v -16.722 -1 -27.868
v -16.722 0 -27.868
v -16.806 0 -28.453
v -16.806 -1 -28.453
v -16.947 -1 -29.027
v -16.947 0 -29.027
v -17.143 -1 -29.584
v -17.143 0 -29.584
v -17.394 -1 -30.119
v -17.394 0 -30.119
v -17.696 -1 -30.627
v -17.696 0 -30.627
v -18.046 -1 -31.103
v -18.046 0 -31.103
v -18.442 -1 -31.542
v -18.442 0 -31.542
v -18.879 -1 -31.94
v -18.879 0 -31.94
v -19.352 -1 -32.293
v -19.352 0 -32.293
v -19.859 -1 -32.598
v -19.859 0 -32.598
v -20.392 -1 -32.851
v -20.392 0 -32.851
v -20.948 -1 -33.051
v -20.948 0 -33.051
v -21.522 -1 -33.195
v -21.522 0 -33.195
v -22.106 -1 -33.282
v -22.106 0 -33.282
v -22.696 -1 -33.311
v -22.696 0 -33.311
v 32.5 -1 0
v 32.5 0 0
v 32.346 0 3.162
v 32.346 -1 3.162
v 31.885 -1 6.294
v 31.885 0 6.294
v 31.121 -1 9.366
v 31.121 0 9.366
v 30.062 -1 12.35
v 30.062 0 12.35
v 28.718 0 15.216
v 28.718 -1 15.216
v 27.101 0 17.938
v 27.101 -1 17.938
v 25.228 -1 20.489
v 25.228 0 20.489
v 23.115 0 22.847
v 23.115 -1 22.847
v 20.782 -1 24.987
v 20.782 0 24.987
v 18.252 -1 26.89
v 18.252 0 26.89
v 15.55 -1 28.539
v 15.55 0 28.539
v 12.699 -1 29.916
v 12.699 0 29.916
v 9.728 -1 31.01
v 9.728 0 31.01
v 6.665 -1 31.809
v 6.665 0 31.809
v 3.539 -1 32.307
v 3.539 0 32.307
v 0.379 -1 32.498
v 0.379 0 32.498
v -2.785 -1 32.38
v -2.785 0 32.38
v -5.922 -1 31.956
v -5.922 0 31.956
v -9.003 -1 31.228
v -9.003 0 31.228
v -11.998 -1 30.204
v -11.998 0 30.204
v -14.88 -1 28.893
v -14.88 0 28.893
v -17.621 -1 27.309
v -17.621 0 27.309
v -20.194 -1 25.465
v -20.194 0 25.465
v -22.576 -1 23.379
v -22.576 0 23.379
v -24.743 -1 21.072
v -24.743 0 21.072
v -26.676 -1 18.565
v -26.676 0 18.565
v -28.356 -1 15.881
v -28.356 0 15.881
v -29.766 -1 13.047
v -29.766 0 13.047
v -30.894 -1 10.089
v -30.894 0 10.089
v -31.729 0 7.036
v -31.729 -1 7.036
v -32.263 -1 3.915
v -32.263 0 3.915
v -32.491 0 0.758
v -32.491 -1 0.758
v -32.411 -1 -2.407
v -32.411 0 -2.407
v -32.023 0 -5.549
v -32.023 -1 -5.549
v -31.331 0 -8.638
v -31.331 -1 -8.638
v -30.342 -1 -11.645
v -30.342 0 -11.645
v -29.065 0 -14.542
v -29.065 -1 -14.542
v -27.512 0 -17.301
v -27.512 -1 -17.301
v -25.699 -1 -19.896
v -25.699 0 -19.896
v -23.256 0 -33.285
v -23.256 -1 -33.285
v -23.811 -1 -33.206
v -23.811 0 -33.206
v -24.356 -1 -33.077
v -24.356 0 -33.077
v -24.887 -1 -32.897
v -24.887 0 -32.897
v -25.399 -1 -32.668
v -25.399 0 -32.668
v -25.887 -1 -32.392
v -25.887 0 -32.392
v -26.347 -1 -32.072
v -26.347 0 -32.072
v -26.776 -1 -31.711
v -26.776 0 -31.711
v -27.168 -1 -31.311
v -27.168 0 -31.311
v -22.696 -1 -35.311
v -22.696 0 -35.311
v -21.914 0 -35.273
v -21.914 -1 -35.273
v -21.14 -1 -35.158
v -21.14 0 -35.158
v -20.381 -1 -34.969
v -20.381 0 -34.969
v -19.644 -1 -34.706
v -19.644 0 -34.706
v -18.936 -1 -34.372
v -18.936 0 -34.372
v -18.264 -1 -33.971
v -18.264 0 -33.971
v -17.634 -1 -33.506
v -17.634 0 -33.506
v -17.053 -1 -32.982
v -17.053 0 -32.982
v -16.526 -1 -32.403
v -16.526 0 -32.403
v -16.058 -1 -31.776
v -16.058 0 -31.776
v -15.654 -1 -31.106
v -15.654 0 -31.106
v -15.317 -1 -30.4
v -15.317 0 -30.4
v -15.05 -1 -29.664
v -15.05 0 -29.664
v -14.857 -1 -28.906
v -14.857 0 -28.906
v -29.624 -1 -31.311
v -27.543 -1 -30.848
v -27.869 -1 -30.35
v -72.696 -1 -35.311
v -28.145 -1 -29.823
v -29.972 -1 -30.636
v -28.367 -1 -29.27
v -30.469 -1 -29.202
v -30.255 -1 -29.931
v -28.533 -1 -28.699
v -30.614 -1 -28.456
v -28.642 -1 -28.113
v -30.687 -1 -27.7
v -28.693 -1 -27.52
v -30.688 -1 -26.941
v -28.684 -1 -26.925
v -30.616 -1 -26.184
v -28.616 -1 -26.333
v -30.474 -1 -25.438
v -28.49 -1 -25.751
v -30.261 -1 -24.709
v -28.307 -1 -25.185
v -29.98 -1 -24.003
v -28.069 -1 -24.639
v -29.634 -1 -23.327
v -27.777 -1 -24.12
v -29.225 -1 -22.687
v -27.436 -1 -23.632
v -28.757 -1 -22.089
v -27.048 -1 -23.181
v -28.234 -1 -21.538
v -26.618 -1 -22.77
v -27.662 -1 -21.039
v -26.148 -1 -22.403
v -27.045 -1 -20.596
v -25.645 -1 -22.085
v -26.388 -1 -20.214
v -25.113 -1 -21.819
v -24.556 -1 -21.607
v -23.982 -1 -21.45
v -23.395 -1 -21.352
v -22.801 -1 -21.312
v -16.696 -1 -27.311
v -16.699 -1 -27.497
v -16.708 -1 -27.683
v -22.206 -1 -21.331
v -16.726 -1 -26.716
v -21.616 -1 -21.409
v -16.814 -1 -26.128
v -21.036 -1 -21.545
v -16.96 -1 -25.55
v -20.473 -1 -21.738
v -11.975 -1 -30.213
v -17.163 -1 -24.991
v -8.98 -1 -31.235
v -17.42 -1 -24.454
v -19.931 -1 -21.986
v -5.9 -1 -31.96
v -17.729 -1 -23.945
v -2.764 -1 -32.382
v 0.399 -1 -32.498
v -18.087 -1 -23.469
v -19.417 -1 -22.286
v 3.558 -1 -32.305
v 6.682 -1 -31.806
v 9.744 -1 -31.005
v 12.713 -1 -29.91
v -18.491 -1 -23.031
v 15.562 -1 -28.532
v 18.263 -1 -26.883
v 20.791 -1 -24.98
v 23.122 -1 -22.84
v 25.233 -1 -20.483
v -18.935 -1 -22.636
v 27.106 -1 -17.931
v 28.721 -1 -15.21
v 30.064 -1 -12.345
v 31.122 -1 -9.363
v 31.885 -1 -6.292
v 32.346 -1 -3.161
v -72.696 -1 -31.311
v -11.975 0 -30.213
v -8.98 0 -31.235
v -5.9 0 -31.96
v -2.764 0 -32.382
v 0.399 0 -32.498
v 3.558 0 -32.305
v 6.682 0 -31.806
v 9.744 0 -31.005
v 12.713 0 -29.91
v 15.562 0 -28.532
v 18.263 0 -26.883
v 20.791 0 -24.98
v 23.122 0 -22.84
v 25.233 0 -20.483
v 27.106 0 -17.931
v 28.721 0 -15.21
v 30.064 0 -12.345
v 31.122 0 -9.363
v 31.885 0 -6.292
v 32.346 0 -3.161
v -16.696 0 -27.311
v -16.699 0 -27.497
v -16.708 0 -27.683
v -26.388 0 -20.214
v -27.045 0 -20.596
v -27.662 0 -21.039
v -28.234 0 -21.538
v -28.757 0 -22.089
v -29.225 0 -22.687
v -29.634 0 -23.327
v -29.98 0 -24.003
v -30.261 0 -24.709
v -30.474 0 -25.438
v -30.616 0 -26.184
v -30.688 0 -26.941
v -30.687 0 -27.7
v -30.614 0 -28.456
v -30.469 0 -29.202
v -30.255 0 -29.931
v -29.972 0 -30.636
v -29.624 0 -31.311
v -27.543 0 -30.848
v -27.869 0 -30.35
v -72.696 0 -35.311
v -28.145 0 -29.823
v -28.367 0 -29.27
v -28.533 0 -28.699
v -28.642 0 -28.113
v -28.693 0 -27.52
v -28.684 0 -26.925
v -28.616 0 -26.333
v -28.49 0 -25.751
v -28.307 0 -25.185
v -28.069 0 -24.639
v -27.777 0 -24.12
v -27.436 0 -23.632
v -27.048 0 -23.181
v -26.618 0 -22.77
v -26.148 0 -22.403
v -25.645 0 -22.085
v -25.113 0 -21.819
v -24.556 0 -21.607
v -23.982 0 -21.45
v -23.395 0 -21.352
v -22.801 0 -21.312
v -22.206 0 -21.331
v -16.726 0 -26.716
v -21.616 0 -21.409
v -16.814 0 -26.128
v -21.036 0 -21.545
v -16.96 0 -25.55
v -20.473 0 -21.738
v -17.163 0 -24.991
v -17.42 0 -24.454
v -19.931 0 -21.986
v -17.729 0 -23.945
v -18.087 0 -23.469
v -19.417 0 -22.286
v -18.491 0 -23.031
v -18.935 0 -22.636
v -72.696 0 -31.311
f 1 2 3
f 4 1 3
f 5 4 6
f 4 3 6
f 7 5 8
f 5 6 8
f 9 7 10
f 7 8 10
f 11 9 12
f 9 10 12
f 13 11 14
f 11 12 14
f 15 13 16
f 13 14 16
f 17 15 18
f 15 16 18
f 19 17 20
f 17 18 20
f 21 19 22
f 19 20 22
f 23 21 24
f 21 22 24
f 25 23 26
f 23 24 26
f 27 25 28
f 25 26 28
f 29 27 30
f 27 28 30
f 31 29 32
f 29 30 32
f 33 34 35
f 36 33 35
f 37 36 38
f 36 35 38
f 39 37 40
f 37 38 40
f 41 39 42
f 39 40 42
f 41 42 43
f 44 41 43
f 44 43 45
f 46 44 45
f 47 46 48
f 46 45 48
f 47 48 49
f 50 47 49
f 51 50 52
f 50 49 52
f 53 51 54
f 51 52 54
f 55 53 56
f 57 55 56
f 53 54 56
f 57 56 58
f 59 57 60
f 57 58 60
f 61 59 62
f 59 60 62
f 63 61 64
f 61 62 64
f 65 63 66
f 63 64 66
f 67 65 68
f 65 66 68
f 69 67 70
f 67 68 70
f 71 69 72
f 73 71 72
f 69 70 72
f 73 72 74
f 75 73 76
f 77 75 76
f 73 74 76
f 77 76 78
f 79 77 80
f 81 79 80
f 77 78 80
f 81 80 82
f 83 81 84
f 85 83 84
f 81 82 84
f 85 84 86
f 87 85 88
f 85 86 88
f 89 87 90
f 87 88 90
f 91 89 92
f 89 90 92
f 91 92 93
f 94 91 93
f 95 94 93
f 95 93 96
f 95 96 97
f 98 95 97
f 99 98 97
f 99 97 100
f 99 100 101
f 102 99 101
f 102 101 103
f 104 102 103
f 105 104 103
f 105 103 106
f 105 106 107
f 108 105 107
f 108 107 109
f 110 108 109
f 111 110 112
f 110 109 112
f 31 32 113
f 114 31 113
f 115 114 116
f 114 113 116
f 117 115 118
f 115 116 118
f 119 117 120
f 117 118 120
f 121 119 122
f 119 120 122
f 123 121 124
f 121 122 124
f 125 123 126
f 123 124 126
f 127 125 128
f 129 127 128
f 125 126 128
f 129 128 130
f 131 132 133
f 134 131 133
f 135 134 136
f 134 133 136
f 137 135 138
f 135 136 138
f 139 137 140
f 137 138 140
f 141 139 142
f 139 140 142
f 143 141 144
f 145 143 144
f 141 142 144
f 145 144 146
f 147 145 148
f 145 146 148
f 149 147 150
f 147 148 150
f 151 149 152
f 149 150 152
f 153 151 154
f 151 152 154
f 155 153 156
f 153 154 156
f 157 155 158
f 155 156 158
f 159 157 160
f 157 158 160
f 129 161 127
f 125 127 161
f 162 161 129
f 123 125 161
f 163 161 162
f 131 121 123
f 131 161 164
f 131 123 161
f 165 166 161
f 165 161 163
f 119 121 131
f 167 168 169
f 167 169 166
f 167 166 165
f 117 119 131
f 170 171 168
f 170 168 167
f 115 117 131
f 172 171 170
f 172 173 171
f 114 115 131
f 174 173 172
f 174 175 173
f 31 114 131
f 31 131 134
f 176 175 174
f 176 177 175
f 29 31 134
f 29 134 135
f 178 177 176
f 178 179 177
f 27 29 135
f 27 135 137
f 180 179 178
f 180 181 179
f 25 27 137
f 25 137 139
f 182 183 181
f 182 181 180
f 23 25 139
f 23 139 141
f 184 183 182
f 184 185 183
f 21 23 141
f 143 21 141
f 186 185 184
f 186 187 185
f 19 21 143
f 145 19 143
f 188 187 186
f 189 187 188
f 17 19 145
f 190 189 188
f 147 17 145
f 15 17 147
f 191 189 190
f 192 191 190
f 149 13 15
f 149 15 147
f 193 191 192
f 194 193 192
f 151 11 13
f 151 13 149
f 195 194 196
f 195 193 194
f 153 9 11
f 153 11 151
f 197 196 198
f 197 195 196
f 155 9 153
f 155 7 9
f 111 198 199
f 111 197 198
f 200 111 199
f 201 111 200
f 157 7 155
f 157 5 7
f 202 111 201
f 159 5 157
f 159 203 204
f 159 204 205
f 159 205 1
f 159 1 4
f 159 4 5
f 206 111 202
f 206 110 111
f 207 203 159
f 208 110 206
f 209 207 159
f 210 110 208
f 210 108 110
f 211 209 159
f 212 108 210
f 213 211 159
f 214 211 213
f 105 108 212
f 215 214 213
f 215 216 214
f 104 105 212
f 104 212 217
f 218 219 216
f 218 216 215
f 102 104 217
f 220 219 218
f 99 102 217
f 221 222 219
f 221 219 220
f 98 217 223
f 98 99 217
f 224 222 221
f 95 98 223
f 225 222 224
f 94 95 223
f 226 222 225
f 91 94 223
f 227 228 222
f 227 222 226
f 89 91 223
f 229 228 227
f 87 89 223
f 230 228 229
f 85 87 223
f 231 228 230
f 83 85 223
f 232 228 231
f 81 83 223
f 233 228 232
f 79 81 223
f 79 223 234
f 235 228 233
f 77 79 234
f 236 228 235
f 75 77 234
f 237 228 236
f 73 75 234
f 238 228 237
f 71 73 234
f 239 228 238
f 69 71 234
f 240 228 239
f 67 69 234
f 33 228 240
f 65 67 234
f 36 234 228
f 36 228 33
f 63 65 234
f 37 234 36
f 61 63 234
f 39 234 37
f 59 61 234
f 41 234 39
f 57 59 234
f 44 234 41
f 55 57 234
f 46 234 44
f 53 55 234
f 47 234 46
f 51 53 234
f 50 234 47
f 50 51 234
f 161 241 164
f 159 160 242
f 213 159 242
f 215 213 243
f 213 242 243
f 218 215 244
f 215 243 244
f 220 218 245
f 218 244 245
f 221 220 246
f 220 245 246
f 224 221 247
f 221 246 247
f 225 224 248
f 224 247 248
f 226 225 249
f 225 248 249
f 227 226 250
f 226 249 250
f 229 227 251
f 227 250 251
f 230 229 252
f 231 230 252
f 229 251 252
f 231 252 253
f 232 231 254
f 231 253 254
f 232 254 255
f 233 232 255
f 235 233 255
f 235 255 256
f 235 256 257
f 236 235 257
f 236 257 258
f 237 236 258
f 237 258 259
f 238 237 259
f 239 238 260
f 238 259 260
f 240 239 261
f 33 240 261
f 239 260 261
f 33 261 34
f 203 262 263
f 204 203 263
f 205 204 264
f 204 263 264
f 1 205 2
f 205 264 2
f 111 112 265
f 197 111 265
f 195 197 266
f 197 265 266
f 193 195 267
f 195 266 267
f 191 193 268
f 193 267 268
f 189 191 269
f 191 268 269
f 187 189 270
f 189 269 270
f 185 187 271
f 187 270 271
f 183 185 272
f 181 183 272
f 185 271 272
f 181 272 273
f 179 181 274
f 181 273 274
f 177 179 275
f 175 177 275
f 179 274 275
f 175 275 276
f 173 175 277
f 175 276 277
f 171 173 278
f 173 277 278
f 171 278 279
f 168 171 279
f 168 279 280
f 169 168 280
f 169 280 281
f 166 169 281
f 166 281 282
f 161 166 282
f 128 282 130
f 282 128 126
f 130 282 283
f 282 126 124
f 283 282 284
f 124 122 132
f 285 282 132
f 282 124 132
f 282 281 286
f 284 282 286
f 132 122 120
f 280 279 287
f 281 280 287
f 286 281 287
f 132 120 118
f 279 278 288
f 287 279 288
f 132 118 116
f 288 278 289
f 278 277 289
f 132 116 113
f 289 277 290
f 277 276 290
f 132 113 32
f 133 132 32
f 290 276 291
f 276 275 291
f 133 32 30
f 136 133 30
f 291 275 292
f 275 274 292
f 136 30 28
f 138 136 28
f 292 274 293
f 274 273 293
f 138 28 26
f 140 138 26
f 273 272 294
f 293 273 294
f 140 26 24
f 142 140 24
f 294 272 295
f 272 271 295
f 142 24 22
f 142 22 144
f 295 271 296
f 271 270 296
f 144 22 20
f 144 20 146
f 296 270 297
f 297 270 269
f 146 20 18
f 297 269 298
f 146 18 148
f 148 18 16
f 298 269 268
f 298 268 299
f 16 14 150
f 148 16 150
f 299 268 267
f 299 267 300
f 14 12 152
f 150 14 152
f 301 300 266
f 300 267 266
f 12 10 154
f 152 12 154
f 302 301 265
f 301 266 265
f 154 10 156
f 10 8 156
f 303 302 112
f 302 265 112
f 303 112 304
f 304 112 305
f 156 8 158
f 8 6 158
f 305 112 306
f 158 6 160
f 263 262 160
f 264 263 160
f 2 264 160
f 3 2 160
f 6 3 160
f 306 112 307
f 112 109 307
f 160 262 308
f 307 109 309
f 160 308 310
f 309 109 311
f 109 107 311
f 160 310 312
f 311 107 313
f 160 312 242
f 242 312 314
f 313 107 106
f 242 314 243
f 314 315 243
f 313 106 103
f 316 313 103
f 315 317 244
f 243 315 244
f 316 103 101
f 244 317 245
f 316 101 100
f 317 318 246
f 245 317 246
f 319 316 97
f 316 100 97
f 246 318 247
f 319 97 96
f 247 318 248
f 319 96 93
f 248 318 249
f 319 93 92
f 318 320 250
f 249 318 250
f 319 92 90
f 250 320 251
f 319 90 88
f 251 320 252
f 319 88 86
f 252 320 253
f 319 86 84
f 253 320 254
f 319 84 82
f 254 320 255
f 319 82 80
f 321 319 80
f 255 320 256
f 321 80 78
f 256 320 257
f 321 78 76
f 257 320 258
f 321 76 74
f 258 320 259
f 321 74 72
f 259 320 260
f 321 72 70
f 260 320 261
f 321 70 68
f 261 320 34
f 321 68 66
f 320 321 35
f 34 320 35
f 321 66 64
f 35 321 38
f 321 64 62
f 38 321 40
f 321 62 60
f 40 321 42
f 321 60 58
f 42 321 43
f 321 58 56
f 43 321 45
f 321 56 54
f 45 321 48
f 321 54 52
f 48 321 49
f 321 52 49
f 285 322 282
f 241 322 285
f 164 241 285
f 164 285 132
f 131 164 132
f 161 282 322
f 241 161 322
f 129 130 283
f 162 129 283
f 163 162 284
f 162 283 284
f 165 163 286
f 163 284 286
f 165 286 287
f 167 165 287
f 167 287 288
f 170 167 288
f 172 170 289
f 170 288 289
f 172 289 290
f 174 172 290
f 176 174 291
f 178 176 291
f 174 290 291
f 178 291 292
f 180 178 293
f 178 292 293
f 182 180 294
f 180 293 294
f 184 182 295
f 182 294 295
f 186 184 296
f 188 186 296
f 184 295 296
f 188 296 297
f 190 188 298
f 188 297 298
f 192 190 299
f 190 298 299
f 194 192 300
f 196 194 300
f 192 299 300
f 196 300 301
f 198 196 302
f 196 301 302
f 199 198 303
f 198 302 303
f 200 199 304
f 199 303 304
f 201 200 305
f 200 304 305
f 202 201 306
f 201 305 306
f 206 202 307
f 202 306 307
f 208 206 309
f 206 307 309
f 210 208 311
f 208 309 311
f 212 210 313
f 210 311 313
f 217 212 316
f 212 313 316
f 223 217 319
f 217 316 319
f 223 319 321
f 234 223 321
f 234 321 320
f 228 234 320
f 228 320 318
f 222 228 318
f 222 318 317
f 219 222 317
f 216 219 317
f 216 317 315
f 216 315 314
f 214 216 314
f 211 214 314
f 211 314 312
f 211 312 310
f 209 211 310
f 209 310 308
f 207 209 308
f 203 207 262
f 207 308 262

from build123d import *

# Parameters (mm, degrees)
F1_DEPTH = 1


with BuildPart() as f1:
    # F0 (on Front) → F1 (new body)
    with BuildSketch(Plane.XZ):
        with BuildLine():
            ThreePointArc((-14.8566900459, -28.905514368), (16.9323296316, -27.7406959762), (32.5, 0))
            ThreePointArc((32.5, 0), (-10.5130507391, 30.7526545872), (-25.6985085636, -19.8956441868))
            ThreePointArc((-25.6985085636, -19.8956441868), (-18.2250702901, -20.6769291866), (-14.6961524227, -27.3108891325))
            ThreePointArc((-14.6961524227, -27.3108891325), (-14.7363880099, -28.1122320632), (-14.8566900459, -28.905514368))
        make_face()
        with BuildLine():
            ThreePointArc((-14.6961524227, -27.3108891325), (-18.2250702901, -20.6769291866), (-25.6985085636, -19.8956441868))
            ThreePointArc((-25.6985085636, -19.8956441868), (-25.0312995122, -20.7288215953), (-24.3370897754, -21.5396393021))
            ThreePointArc((-24.3370897754, -21.5396393021), (-19.0799129475, -22.5231117715), (-16.6961524227, -27.3108891325))
            ThreePointArc((-16.6961524227, -27.3108891325), (-16.7026347711, -27.5897191161), (-16.7220678093, -27.8679466086))
            ThreePointArc((-16.7220678093, -27.8679466086), (-15.7978993424, -28.4020488058), (-14.8566900459, -28.905514368))
            ThreePointArc((-14.8566900459, -28.905514368), (-14.7363880099, -28.1122320632), (-14.6961524227, -27.3108891325))
        make_face()
        with BuildLine():
            ThreePointArc((-24.3370897754, -21.5396393021), (-25.0312995122, -20.7288215953), (-25.6985085636, -19.8956441868))
            ThreePointArc((-25.6985085636, -19.8956441868), (-30.2612668731, -24.7091506075), (-29.624355653, -31.3108891325))
            Line((-29.624355653, -31.3108891325), (-27.1682883777, -31.3108891325))
            ThreePointArc((-27.1682883777, -31.3108891325), (-28.4591158208, -25.6410828946), (-24.3370897754, -21.5396393021))
        make_face()
        with BuildLine():
            ThreePointArc((-22.6961524227, -35.3108891325), (-17.6343840501, -33.5059275458), (-14.8566900459, -28.905514368))
            ThreePointArc((-14.8566900459, -28.905514368), (-15.7978993424, -28.4020488058), (-16.7220678093, -27.8679466086))
            ThreePointArc((-16.7220678093, -27.8679466086), (-18.6552580203, -31.7461086793), (-22.6961524227, -33.3108891325))
            Line((-22.6961524227, -33.3108891325), (-22.6961524227, -35.3108891325))
        make_face()
        with BuildLine():
            ThreePointArc((-22.6961524227, -35.3108891325), (-26.6961524227, -34.2390923627), (-29.624355653, -31.3108891325))
            Line((-29.624355653, -31.3108891325), (-72.6961524227, -31.3108891325))
            Line((-72.6961524227, -31.3108891325), (-72.6961524227, -35.3108891325))
            Line((-72.6961524227, -35.3108891325), (-22.6961524227, -35.3108891325))
        make_face()
        with BuildLine():
            Line((-27.1682883777, -31.3108891325), (-29.624355653, -31.3108891325))
            ThreePointArc((-29.624355653, -31.3108891325), (-26.6961524227, -34.2390923627), (-22.6961524227, -35.3108891325))
            Line((-22.6961524227, -35.3108891325), (-22.6961524227, -33.3108891325))
            ThreePointArc((-22.6961524227, -33.3108891325), (-25.1456421655, -32.7881147075), (-27.1682883777, -31.3108891325))
        make_face()
    extrude(amount=F1_DEPTH)


solid = f1.part
